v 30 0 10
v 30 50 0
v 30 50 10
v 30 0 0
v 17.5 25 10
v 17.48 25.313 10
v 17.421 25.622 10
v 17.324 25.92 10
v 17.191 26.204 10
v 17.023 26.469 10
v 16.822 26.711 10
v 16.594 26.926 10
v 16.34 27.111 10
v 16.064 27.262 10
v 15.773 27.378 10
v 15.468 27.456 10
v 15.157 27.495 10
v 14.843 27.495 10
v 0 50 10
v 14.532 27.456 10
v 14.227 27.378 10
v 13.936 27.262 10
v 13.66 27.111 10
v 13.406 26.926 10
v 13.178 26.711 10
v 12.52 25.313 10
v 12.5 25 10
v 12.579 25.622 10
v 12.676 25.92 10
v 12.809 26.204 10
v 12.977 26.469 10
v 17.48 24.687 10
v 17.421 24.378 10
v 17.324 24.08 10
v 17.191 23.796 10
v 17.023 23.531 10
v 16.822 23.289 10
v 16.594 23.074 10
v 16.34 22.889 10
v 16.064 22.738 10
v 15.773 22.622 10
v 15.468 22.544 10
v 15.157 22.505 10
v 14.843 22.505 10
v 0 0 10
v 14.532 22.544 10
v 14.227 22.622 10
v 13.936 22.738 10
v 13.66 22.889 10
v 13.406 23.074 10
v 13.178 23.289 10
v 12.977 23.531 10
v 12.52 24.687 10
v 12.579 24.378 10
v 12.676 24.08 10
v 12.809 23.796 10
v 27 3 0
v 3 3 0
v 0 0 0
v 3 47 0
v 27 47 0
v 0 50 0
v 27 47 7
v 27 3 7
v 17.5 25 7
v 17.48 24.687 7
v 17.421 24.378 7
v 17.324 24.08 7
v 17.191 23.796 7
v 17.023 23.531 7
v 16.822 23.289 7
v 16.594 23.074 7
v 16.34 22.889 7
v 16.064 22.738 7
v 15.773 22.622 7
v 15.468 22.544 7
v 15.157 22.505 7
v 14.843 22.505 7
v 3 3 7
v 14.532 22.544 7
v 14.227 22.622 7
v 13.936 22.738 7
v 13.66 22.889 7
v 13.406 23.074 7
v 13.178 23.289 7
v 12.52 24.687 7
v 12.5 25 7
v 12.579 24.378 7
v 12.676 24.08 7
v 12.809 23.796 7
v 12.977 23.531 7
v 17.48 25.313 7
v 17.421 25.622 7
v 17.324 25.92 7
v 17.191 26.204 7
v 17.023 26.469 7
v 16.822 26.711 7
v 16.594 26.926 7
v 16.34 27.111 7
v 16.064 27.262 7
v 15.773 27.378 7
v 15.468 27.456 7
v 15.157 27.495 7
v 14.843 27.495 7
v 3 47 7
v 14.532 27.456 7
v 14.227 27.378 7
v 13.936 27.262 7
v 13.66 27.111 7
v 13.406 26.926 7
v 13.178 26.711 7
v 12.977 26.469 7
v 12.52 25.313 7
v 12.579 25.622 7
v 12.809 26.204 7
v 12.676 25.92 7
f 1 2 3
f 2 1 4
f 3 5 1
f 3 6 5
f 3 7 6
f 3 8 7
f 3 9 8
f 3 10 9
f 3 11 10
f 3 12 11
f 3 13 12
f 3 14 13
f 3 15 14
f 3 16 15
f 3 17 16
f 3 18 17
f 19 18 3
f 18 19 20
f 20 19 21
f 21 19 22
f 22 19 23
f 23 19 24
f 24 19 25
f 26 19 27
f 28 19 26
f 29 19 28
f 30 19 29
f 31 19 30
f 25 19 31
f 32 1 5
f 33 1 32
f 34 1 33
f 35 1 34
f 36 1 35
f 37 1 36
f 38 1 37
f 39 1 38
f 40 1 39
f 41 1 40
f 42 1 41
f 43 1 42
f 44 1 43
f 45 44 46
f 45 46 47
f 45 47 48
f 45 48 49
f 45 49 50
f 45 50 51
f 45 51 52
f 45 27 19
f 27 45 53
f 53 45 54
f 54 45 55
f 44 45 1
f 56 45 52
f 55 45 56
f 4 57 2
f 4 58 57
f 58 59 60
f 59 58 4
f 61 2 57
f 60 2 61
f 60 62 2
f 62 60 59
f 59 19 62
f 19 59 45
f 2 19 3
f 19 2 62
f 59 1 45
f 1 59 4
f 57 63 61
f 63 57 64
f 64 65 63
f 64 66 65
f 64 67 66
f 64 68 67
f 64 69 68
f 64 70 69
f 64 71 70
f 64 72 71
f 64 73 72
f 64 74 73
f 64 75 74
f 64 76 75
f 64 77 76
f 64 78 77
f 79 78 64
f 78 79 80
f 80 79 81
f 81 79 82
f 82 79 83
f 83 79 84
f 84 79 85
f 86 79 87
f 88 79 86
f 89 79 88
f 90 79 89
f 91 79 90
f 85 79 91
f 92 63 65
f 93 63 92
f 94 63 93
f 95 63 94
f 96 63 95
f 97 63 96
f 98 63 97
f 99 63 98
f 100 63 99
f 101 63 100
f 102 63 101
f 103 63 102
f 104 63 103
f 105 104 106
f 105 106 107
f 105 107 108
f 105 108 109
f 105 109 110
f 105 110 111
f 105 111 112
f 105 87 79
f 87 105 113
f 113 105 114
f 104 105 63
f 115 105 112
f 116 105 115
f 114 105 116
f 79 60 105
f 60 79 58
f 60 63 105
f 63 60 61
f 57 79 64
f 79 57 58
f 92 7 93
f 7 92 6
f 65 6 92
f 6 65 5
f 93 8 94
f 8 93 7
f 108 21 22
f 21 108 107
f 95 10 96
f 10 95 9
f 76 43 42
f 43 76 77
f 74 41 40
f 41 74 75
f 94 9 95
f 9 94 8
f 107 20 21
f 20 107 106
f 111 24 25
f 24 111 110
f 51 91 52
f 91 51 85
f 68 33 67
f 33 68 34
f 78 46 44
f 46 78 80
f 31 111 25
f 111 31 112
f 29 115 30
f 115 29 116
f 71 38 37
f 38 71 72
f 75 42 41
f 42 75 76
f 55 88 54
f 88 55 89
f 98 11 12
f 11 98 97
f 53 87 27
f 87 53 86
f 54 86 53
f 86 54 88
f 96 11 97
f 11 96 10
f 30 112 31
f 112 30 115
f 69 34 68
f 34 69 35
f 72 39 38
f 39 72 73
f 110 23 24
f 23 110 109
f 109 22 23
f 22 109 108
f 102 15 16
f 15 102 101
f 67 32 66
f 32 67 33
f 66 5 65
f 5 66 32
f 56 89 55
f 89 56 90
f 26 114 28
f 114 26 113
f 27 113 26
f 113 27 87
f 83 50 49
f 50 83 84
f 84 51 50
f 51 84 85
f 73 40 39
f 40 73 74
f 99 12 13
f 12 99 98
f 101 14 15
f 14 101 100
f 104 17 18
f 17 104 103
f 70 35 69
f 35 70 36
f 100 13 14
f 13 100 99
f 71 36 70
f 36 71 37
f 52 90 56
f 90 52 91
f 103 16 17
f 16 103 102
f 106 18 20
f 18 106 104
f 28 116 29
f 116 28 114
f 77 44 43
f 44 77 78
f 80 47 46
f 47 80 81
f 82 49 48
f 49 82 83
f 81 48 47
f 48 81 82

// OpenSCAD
$fn=50;

difference() {
    cube([30,50,10]);
    translate([3,3,-1]) cube([24,44,8]);
    translate([15,25,6.9]) cylinder(d=5, h=12);
}
